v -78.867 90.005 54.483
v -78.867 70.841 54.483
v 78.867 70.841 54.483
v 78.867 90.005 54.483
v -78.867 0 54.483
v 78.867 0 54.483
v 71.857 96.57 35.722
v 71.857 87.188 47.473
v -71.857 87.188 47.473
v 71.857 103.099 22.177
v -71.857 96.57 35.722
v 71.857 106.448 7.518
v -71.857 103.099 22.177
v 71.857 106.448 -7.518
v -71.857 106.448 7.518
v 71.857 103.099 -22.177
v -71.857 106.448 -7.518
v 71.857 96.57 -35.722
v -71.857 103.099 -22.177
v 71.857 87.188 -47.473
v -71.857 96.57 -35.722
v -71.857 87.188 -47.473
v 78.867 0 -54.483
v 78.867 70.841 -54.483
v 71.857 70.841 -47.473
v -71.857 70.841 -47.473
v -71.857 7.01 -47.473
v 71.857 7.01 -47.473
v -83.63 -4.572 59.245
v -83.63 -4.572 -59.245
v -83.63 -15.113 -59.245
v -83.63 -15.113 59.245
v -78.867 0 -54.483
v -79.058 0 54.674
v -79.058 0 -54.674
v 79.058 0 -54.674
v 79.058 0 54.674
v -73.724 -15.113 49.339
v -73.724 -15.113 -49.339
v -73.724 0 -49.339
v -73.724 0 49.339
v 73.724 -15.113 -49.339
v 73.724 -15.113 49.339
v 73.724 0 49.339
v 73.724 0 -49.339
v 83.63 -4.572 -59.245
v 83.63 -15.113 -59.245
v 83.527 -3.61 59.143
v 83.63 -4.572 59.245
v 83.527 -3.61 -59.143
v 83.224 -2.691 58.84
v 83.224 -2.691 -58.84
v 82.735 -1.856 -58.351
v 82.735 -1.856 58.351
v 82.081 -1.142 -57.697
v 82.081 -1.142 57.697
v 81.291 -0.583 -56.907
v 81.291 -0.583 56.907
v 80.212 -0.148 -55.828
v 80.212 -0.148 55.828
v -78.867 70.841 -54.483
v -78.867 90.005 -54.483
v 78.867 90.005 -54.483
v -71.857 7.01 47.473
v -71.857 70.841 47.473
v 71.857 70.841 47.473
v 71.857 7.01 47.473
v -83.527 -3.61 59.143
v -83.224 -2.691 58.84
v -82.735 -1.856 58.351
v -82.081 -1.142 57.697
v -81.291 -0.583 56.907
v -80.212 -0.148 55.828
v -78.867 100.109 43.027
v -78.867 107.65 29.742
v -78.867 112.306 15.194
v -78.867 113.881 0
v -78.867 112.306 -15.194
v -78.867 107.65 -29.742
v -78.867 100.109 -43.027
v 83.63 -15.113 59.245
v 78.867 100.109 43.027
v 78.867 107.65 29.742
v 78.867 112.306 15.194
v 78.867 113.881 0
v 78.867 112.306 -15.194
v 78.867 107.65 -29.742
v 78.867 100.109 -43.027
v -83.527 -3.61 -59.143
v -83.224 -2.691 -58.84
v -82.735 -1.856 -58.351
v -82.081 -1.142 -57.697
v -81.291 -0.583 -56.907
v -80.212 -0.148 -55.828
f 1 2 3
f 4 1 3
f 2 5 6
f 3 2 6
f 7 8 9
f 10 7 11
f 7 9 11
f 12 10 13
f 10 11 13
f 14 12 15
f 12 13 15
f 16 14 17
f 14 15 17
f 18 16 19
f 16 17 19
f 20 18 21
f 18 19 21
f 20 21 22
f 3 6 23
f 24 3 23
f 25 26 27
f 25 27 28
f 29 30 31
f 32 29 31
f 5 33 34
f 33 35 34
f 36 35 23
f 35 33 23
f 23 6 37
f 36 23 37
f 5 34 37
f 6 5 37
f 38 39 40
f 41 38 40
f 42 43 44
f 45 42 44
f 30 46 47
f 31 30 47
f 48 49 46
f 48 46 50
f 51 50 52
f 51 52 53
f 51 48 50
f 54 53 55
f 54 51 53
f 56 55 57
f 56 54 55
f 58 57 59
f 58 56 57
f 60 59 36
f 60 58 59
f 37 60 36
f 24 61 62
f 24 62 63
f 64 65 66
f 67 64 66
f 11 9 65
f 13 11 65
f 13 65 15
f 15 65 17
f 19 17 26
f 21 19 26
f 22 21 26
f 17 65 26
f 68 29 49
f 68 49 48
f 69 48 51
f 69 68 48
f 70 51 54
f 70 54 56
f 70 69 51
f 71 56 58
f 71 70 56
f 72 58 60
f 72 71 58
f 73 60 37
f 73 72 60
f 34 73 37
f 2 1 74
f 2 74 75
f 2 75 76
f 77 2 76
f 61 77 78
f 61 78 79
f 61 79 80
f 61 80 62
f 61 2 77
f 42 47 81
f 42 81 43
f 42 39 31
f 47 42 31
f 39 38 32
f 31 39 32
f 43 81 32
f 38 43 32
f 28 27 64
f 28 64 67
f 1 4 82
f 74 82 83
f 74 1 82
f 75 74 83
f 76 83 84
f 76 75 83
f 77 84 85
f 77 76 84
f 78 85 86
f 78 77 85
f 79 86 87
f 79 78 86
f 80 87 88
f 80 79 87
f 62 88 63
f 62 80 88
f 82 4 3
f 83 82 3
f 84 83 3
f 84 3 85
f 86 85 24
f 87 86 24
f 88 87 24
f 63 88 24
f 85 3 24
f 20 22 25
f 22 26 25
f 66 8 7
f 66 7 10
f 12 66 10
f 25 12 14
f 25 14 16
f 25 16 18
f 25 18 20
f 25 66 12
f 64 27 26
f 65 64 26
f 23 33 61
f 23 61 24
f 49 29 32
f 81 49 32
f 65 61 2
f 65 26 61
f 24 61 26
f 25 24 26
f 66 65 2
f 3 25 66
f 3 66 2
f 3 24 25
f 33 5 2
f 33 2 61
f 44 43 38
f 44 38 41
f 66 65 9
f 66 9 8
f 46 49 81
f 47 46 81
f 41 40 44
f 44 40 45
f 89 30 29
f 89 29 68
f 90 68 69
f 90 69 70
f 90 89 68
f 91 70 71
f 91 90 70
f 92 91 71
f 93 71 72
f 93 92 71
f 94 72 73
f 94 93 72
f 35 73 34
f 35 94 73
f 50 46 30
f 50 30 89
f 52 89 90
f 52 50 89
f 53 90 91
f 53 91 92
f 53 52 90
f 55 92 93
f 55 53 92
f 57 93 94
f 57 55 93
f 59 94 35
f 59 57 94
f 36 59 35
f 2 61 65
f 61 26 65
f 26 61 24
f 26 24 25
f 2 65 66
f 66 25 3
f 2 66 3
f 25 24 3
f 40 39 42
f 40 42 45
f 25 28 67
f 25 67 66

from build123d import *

# Parameters (mm, degrees)
SKETCH1_W           = 157.734
SKETCH1_H           = 108.966
BOSS_EXTRUDE1_DEPTH = 114.1349
CUT_EXTRUDE1_DEPTH  = 208.224316094
SHELL1_T            = -7.0104
SHELL2_T            = -7.0104


with BuildPart() as part:
    # Sketch1 → Boss-Extrude1 (new body)
    with BuildSketch(Plane(origin=(0, 0, 0), x_dir=(1, 0, 0), z_dir=(0, 1, 0))):
        Rectangle(SKETCH1_W, SKETCH1_H)
    extrude(amount=BOSS_EXTRUDE1_DEPTH)

    # Sweep1: sweep along a path in Sketch3
    with BuildLine(Plane.XZ) as sweep1_path:
        Line((78.867, -54.483), (78.867, 54.483))
        Line((78.867, 54.483), (-78.867, 54.483))
        Line((-78.867, 54.483), (-78.867, -54.483))
        Line((-78.867, -54.483), (78.867, -54.483))
    # Sketch2 → Sweep1 (sweep)
    with BuildSketch(Plane.XY.offset(54.483)):
        with BuildLine():
            Line((-78.867, 0), (-79.0575, 0))
            ThreePointArc((-79.0575, 0), (-82.290392204, -1.339107796), (-83.6295, -4.572))
            Line((-83.6295, -4.572), (-83.6295, -15.113))
            Line((-83.6295, -15.113), (-73.7235, -15.113))
            Line((-73.7235, -15.113), (-73.7235, 0))
            Line((-73.7235, 0), (-78.867, 0))
        make_face()
    sweep(path=sweep1_path.line, transition=Transition.RIGHT)

    # Sketch4 → Cut-Extrude1 (cut, through all)
    with BuildSketch(Plane.ZY.offset(78.867)):
        with BuildLine():
            Line((-54.483, 90.0049), (-54.483, 114.1349))
            Line((-54.483, 114.1349), (54.483, 114.1349))
            Line((54.483, 114.1349), (54.483, 90.0049))
            ThreePointArc((54.483, 90.0049), (0, 113.8809), (-54.483, 90.0049))
        make_face()
    extrude(amount=-CUT_EXTRUDE1_DEPTH, mode=Mode.SUBTRACT)


with BuildPart() as body_2:
    # Split1: the piece on the far side of the plane
    add(part.part)
    split(bisect_by=Plane.ZX.offset(70.8406), keep=Keep.BOTTOM)

    # Shell1
    shell1_openings = [body_2.faces().sort_by_distance(p)[0] for p in [
        (0, 70.8406, 0),
    ]]
    offset(amount=SHELL1_T, openings=shell1_openings, kind=Kind.INTERSECTION)


with BuildPart() as part_1:
    add(part.part)

    # Split1
    split(bisect_by=Plane.ZX.offset(70.8406), keep=Keep.TOP)

    # Shell2
    shell2_openings = [part_1.faces().sort_by_distance(p)[0] for p in [
        (0, 70.8406, 0),
    ]]
    offset(amount=SHELL2_T, openings=shell2_openings, kind=Kind.INTERSECTION)


solid = Compound([body_2.part, part_1.part])
